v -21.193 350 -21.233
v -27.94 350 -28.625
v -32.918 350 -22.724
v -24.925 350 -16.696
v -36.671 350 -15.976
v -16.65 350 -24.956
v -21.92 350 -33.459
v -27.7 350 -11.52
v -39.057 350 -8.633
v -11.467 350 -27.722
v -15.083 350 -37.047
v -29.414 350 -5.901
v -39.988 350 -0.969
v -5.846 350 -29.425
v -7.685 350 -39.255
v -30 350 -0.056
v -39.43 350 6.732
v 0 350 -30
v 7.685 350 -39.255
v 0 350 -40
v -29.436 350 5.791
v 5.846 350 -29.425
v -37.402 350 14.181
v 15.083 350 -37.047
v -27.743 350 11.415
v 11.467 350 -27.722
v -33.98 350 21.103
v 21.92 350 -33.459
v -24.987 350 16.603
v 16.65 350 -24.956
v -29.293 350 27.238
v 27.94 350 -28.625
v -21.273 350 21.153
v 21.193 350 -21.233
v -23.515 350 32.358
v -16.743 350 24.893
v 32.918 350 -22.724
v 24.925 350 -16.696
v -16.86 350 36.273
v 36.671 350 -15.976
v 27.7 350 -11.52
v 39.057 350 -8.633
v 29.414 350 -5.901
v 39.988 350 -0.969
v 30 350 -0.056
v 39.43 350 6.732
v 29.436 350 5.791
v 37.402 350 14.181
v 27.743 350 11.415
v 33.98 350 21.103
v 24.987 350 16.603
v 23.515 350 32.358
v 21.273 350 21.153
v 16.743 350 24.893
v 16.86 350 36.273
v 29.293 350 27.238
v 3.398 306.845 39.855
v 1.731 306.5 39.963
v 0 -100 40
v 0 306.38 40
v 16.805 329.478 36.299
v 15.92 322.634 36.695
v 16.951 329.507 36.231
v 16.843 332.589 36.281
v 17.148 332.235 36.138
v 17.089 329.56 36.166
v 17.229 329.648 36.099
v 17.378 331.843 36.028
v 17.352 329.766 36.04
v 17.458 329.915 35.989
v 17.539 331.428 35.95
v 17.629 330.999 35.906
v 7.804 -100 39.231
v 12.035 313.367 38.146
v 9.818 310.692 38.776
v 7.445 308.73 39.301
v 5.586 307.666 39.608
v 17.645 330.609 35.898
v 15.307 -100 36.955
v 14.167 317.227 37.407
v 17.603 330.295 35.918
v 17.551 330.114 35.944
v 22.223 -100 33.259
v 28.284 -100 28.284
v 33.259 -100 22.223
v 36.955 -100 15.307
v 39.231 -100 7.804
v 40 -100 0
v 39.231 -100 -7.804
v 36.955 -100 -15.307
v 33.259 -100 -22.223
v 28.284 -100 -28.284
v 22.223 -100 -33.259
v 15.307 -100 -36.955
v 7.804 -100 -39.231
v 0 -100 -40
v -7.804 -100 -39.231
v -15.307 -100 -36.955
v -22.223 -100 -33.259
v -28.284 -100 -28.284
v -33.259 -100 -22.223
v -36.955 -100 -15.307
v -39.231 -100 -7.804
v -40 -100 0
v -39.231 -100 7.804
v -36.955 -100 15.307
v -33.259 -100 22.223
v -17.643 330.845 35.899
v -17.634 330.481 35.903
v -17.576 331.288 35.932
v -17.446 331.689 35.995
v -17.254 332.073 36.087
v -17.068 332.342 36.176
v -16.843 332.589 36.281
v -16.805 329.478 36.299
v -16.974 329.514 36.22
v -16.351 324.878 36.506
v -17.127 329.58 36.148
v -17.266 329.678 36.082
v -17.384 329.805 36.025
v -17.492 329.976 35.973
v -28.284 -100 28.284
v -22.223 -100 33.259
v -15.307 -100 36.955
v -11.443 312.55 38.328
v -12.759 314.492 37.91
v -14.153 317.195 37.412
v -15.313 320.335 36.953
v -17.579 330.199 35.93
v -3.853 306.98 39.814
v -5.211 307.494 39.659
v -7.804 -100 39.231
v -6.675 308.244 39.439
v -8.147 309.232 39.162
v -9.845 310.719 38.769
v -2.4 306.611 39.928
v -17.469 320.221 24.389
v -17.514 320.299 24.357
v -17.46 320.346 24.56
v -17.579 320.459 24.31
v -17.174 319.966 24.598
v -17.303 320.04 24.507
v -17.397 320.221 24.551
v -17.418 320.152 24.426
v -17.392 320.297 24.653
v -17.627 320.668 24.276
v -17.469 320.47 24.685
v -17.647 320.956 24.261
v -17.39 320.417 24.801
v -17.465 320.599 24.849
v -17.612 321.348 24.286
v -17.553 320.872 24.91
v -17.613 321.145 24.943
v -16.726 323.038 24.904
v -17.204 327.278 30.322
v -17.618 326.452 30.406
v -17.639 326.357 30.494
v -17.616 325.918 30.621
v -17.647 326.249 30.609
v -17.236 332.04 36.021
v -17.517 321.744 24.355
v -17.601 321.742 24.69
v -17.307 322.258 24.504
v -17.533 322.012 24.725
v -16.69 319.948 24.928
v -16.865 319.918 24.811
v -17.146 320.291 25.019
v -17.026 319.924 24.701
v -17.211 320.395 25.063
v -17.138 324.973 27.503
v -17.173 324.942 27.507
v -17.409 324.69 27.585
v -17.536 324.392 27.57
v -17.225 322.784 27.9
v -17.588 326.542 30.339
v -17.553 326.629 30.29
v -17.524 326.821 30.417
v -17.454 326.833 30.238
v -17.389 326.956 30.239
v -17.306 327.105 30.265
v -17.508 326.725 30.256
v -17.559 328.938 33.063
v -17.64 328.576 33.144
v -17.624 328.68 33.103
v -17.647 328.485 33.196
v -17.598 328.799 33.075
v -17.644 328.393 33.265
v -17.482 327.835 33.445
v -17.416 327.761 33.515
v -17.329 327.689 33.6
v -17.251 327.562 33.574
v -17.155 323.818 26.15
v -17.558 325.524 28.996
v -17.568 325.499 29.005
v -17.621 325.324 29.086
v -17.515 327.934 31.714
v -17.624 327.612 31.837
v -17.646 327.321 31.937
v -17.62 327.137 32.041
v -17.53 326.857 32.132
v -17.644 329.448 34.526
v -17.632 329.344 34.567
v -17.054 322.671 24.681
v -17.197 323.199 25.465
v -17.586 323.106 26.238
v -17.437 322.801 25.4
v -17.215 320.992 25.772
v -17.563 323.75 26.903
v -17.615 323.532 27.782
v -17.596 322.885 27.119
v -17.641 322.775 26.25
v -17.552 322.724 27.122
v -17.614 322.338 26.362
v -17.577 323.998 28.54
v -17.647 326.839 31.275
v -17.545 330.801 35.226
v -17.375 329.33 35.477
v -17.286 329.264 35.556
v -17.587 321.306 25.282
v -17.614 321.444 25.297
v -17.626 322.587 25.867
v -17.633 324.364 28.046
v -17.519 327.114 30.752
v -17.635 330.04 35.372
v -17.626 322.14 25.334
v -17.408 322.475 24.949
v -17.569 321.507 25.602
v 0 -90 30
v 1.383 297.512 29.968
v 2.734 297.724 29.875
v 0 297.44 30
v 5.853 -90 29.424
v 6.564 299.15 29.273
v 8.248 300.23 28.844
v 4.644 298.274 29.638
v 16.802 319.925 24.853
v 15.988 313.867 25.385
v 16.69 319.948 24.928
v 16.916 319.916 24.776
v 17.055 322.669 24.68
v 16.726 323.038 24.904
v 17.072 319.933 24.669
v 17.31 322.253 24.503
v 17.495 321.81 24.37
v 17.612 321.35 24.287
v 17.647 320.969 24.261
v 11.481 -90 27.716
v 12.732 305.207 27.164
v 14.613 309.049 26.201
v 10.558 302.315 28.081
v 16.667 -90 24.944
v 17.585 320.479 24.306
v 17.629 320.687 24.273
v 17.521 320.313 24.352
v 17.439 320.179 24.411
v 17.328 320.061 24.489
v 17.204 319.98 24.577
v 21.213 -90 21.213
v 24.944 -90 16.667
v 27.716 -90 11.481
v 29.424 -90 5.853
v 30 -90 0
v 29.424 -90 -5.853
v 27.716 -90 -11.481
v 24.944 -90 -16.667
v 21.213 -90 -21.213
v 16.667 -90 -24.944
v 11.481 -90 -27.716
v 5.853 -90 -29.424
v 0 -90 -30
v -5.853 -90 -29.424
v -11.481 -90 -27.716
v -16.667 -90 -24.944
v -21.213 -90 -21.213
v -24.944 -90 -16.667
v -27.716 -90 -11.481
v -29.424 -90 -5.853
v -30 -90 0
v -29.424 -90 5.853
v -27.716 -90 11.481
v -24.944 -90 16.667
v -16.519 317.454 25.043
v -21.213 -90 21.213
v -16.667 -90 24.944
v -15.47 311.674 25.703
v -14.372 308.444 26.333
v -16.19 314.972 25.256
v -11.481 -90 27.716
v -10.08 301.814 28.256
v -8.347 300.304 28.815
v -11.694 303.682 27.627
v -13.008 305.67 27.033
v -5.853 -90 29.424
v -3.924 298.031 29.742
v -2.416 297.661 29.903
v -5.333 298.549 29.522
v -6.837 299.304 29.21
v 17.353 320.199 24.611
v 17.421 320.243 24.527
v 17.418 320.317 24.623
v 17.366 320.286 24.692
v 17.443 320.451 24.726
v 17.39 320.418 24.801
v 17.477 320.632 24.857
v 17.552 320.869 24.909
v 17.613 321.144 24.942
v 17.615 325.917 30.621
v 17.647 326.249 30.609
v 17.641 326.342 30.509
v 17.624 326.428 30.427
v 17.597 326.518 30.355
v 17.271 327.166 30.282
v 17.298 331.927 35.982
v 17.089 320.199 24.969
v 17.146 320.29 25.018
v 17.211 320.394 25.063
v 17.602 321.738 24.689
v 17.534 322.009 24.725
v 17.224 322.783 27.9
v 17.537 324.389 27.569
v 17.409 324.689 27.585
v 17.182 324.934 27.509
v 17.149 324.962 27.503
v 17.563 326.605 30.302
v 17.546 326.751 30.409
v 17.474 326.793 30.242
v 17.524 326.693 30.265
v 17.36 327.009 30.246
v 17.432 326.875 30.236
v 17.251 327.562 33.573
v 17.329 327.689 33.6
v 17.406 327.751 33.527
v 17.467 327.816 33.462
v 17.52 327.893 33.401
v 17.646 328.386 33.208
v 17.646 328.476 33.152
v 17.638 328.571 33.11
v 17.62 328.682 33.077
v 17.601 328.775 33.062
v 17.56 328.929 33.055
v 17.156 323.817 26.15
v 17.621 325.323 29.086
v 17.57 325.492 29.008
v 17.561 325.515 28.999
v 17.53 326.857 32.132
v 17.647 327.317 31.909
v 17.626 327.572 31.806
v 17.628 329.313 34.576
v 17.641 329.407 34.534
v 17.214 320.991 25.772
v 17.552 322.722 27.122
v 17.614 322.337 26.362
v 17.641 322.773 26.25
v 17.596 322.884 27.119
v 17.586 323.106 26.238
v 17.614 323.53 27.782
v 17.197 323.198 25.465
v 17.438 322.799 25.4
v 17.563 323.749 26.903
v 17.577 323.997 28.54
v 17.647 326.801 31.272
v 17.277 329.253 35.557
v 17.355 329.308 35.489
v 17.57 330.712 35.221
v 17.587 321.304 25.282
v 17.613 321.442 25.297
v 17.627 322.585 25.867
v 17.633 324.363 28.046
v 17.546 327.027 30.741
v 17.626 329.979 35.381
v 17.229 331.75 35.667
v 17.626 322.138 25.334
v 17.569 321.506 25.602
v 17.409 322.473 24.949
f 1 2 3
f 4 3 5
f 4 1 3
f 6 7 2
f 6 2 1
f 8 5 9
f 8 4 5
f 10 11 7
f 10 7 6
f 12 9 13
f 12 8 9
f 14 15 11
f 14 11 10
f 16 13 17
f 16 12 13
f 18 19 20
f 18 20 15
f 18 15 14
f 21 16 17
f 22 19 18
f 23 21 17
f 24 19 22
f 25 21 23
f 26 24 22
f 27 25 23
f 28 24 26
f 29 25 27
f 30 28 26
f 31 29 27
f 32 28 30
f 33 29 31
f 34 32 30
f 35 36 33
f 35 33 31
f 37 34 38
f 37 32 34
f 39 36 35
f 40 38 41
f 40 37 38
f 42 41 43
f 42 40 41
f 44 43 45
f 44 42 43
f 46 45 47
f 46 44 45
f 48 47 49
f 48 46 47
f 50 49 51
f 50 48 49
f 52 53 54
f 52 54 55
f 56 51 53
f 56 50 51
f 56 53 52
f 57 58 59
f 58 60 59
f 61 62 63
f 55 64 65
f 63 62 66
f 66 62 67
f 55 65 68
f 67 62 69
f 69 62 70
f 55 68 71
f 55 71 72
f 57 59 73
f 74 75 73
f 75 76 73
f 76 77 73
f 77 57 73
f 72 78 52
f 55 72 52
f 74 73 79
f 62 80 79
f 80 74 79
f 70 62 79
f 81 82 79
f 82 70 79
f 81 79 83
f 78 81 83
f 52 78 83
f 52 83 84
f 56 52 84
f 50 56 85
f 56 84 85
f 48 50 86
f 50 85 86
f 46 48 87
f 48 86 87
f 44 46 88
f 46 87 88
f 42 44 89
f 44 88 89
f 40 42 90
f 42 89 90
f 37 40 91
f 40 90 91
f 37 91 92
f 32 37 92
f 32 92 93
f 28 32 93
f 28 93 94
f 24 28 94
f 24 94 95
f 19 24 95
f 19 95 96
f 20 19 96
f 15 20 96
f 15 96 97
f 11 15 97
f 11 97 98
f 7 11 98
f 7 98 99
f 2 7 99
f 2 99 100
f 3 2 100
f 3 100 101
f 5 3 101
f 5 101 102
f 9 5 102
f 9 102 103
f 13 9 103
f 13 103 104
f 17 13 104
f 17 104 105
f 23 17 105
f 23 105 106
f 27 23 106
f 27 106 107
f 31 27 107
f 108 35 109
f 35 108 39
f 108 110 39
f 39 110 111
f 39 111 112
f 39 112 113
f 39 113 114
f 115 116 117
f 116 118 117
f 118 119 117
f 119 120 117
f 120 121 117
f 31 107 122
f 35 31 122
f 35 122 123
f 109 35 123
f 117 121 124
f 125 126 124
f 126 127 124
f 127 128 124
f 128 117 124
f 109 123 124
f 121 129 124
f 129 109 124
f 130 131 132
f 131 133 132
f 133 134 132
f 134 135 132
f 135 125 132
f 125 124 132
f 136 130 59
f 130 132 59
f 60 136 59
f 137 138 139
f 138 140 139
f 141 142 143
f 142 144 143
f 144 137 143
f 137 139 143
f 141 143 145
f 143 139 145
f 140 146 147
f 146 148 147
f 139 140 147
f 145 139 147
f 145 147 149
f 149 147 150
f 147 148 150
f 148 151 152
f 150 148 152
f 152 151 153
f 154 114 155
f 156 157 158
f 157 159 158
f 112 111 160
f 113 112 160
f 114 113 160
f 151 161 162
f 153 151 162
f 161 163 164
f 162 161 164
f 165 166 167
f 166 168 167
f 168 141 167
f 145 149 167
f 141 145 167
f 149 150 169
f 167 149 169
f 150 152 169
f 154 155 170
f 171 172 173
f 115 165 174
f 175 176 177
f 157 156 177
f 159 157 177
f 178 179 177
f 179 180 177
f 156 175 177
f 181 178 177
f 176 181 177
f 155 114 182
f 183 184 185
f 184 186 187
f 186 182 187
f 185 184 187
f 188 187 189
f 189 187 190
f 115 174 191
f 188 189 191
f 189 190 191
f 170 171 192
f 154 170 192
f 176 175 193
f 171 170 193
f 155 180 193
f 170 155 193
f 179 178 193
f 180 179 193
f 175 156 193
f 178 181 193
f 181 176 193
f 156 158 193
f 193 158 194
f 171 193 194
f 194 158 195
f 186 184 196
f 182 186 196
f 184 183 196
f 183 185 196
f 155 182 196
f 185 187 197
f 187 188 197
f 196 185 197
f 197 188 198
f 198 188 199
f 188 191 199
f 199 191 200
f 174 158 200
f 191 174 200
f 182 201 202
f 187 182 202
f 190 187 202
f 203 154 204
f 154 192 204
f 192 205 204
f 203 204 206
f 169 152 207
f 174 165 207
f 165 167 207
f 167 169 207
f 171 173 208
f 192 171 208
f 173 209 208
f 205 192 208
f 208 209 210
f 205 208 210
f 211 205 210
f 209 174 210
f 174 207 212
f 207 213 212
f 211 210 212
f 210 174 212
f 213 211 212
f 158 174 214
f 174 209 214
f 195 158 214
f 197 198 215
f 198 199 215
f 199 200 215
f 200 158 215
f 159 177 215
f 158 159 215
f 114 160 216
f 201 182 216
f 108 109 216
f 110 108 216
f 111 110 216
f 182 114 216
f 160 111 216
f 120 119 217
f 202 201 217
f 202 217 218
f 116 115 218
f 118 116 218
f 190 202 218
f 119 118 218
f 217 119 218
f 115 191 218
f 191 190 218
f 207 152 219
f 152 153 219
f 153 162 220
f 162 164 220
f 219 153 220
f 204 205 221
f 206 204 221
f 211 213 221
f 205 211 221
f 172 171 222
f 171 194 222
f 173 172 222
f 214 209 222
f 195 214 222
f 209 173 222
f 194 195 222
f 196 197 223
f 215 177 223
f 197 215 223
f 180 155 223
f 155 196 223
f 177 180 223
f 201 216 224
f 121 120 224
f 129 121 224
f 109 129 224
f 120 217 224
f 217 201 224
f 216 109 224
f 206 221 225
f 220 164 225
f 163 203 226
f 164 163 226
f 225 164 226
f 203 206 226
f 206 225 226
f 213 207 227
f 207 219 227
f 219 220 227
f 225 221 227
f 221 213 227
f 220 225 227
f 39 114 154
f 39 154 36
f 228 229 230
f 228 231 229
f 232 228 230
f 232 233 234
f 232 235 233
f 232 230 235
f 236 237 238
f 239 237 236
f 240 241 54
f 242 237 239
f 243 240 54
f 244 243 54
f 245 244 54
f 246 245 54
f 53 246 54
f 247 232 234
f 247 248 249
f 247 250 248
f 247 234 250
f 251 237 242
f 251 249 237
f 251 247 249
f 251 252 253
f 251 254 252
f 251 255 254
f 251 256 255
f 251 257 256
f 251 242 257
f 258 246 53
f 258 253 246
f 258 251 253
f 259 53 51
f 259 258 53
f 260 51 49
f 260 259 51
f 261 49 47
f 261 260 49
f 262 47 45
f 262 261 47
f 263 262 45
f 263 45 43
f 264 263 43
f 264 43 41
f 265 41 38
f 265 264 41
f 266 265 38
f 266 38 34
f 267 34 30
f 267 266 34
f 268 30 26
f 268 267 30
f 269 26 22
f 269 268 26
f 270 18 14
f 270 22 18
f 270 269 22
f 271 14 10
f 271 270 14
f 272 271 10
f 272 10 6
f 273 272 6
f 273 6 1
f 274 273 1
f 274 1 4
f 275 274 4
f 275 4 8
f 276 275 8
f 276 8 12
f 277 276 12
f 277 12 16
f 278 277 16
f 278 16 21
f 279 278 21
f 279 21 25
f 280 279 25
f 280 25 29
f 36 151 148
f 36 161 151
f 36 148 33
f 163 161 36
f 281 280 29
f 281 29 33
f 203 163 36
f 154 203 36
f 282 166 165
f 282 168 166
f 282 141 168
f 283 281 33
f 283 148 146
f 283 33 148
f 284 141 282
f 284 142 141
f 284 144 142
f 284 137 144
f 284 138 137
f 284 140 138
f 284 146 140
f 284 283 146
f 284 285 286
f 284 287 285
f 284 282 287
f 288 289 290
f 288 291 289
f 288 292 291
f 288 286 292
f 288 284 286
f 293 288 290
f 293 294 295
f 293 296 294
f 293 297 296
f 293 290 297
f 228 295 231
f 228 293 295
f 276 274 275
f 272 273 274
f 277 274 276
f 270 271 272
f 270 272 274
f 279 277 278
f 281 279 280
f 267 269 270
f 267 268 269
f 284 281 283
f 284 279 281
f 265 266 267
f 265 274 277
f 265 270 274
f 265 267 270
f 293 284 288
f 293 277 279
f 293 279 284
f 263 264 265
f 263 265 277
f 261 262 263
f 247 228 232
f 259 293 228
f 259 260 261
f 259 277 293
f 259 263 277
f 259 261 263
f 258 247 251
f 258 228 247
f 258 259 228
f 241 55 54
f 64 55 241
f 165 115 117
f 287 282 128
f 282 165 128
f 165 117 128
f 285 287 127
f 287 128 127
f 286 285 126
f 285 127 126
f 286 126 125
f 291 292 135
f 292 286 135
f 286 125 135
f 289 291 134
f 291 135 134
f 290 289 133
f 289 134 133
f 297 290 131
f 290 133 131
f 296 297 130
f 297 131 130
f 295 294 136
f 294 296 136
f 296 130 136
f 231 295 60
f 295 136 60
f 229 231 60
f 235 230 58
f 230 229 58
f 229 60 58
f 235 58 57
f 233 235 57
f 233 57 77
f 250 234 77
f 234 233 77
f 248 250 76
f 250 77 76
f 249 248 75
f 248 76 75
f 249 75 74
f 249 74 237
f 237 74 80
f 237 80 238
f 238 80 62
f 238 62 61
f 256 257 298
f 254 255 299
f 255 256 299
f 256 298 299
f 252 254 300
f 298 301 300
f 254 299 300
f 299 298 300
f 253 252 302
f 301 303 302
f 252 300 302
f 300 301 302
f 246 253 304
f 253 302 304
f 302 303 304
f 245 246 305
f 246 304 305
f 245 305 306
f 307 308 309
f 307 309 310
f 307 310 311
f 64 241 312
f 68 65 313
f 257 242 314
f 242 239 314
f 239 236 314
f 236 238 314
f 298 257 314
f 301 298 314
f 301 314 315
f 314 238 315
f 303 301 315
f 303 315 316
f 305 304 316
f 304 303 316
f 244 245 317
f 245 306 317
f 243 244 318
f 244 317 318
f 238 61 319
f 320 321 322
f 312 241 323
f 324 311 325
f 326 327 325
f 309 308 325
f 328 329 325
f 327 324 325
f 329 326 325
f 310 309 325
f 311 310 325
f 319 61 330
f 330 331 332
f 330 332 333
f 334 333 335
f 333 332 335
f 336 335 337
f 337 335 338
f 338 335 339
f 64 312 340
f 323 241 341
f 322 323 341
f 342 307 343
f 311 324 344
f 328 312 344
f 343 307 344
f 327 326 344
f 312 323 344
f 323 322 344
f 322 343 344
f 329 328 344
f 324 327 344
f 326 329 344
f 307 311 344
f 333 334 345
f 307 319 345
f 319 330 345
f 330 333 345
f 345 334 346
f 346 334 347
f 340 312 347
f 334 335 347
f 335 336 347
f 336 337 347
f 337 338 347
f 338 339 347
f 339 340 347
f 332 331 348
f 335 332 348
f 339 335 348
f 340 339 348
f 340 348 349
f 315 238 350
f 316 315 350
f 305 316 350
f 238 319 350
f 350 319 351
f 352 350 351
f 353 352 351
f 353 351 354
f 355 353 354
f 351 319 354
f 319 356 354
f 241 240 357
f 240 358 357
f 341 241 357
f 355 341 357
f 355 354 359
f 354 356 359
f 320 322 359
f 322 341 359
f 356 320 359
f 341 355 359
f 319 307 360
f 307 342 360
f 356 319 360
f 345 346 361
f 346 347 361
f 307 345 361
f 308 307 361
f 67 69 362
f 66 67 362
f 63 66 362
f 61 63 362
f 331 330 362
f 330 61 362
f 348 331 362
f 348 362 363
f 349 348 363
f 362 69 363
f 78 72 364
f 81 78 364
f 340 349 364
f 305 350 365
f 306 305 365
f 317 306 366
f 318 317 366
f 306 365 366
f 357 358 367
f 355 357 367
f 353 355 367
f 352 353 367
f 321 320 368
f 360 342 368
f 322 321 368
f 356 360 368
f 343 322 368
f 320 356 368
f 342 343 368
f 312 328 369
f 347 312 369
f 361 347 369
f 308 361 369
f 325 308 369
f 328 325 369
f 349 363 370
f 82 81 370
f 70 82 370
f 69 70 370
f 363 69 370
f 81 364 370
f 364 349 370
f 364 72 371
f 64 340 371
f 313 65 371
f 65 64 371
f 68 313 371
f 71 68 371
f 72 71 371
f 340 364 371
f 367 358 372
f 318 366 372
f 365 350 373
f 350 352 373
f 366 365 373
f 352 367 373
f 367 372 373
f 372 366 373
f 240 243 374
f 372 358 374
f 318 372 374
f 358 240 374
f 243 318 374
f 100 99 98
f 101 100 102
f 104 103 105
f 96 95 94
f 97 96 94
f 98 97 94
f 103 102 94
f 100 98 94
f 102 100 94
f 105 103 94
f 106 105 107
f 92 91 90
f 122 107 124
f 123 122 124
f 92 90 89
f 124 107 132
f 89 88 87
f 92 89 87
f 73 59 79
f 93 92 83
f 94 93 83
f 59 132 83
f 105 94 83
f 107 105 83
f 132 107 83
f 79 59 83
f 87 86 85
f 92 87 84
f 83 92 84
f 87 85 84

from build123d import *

# Parameters (mm, degrees)
BOSS_EXTRUDE2_DEPTH      = 350
BOSS_EXTRUDE2_DEPTH_BACK = 100
SKETCH12_R               = 40
SHELL1_T                 = -10


with BuildPart() as part:
    # Sketch12 → Boss-Extrude2 (new, two sides: drawn at the far end of the back side and taken through both)
    with BuildSketch(Plane(origin=(0, 0, 0), x_dir=(1, 0, 0), z_dir=(0, 1, 0)).offset(-BOSS_EXTRUDE2_DEPTH_BACK)):
        with Locations(Location((0, 0, 0), (0, 0, 270))):
            Circle(SKETCH12_R)
    extrude(amount=BOSS_EXTRUDE2_DEPTH + BOSS_EXTRUDE2_DEPTH_BACK)

    # Shell1
    shell1_openings = [part.faces().sort_by_distance(p)[0] for p in [
        (0, 350, 0),
    ]]
    offset(amount=SHELL1_T, openings=shell1_openings, kind=Kind.INTERSECTION)

    # Cut-Loft1: read off the stored shape, not the designer's step
    # Cut-Loft1: loft between two sections, ruled curve by curve
    cut_loft1_from = [
        Edge.make_bspline([(16.447768561, 299.687176089, 0.756078446), (16.559756866, 299.68551177, 0.757474976), (16.685169468, 299.695855255, 0.748795762), (16.948630904, 299.758019264, 0.696633965), (17.086724057, 299.810484473, 0.652610427), (17.338586824, 299.967314565, 0.521014355), (17.451178642, 300.072155873, 0.433042052), (17.606011876, 300.316064015, 0.22837882), (17.647058824, 300.454214414, 0.112456871), (17.647058824, 300.722256174, -0.112456871), (17.606011876, 300.860406573, -0.22837882), (17.451178642, 301.104314716, -0.433042052), (17.338586824, 301.209156023, -0.521014355), (17.086724057, 301.365986115, -0.652610427), (16.948630904, 301.418451325, -0.696633965), (16.685169468, 301.480615333, -0.748795762), (16.559756866, 301.490958819, -0.757474976), (16.447768561, 301.489294499, -0.756078446)], [0, 0, 0, 0, 0.125, 0.125, 0.25, 0.25, 0.375, 0.375, 0.5, 0.5, 0.625, 0.625, 0.75, 0.75, 0.875, 0.875, 1, 1, 1, 1], 3),
        Edge.make_bspline([(16.447768561, 301.489294499, -0.756078446), (14.881581053, 332.389152096, -26.684137559), (-14.881581053, 332.389152096, -26.684137559), (-16.447768561, 301.489294499, -0.756078446)], [0, 0, 0, 0, 1, 1, 1, 1], 3, [1, 0.368414451, 0.368414451, 1]),
        Edge.make_bspline([(-16.447768561, 299.687176089, 0.756078446), (-14.881581053, 268.787318493, 26.684137559), (14.881581053, 268.787318493, 26.684137559), (16.447768561, 299.687176089, 0.756078446)], [0, 0, 0, 0, 1, 1, 1, 1], 3, [1, 0.368414451, 0.368414451, 1]),
        Edge.make_bspline([(-16.447768561, 301.489294499, -0.756078446), (-16.559756866, 301.490958819, -0.757474976), (-16.685169468, 301.480615333, -0.748795762), (-16.948630904, 301.418451325, -0.696633965), (-17.086724057, 301.365986115, -0.652610427), (-17.338586824, 301.209156023, -0.521014355), (-17.451178642, 301.104314716, -0.433042052), (-17.606011876, 300.860406573, -0.22837882), (-17.647058824, 300.722256174, -0.112456871), (-17.647058824, 300.454214414, 0.112456871), (-17.606011876, 300.316064015, 0.22837882), (-17.451178642, 300.072155873, 0.433042052), (-17.338586824, 299.967314565, 0.521014355), (-17.086724057, 299.810484473, 0.652610427), (-16.948630904, 299.758019264, 0.696633965), (-16.685169468, 299.695855255, 0.748795762), (-16.559756866, 299.68551177, 0.757474976), (-16.447768561, 299.687176089, 0.756078446)], [0, 0, 0, 0, 0.125, 0.125, 0.25, 0.25, 0.375, 0.375, 0.5, 0.5, 0.625, 0.625, 0.75, 0.75, 0.875, 0.875, 1, 1, 1, 1], 3),
    ]
    cut_loft1_to = [
        Edge.make_bspline([(17.602105154, 396.042079443, 115.71580798), (17.609587889, 396.12223285, 115.648551286), (17.616135283, 396.20246302, 115.58123018), (17.627359386, 396.363038504, 115.44649135), (17.632036096, 396.443383819, 115.379073626), (17.639518831, 396.604151212, 115.244173766), (17.642324857, 396.68457329, 115.17669163), (17.646066225, 396.845455828, 115.041695152), (17.647001567, 396.925916287, 114.97418081), (17.647001567, 397.086837207, 114.839152126), (17.646066225, 397.167297667, 114.771637784), (17.642324857, 397.328180204, 114.636641306), (17.639518831, 397.408602282, 114.569159169), (17.632036096, 397.569369675, 114.434259309), (17.627359386, 397.64971499, 114.366841585), (17.616135283, 397.810290475, 114.232102756), (17.609587889, 397.890520644, 114.16478165), (17.602105154, 397.970674051, 114.097524956)], [0, 0, 0, 0, 0.125, 0.125, 0.25, 0.25, 0.375, 0.375, 0.5, 0.5, 0.625, 0.625, 0.75, 0.75, 0.875, 0.875, 1, 1, 1, 1], 3),
        Edge.make_bspline([(17.602105154, 397.970674051, 114.097524956), (15.404444247, 421.511531348, 94.34440028), (-15.404444247, 421.511531348, 94.34440028), (-17.602105154, 397.970674051, 114.097524956)], [0, 0, 0, 0, 1, 1, 1, 1], 3, [1, 0.380888028, 0.380888028, 1]),
        Edge.make_bspline([(-17.602105154, 396.042079443, 115.71580798), (-15.404444247, 372.501222146, 135.468932655), (15.404444247, 372.501222146, 135.468932655), (17.602105154, 396.042079443, 115.71580798)], [0, 0, 0, 0, 1, 1, 1, 1], 3, [1, 0.380888028, 0.380888028, 1]),
        Edge.make_bspline([(-17.602105154, 397.970674051, 114.097524956), (-17.609587889, 397.890520644, 114.16478165), (-17.616135283, 397.810290475, 114.232102756), (-17.627359386, 397.64971499, 114.366841585), (-17.632036096, 397.569369675, 114.434259309), (-17.639518831, 397.408602282, 114.569159169), (-17.642324857, 397.328180204, 114.636641306), (-17.646066225, 397.167297667, 114.771637784), (-17.647001567, 397.086837207, 114.839152126), (-17.647001567, 396.925916287, 114.97418081), (-17.646066225, 396.845455828, 115.041695152), (-17.642324857, 396.68457329, 115.17669163), (-17.639518831, 396.604151212, 115.244173766), (-17.632036096, 396.443383819, 115.379073626), (-17.627359386, 396.363038504, 115.44649135), (-17.616135283, 396.20246302, 115.58123018), (-17.609587889, 396.12223285, 115.648551286), (-17.602105154, 396.042079443, 115.71580798)], [0, 0, 0, 0, 0.125, 0.125, 0.25, 0.25, 0.375, 0.375, 0.5, 0.5, 0.625, 0.625, 0.75, 0.75, 0.875, 0.875, 1, 1, 1, 1], 3),
    ]
    cut_loft1 = Solid(Shell([*[Face.make_surface_from_curves(cut_loft1_from[k], cut_loft1_to[k]) for k in range(4)], Face(Wire(cut_loft1_from)), Face(Wire(cut_loft1_to))]))
    add(cut_loft1, mode=Mode.SUBTRACT)

    # Sketch15 → Cut-Loft3 section 0
    with BuildSketch(Plane.XY):
        with BuildLine():
            Line((-16.470588235, 350), (16.470588235, 350))
            Line((16.470588235, 350), (16.470588235, 300.588235294))
            Line((16.470588235, 300.588235294), (-16.470588235, 300.588235294))
            Line((-16.470588235, 300.588235294), (-16.470588235, 350))
        make_face()
    # Sketch20 → Cut-Loft3 section 1
    with BuildSketch(Plane(origin=(0, 397.006376747, 114.906666468), x_dir=(1, 0, 0), z_dir=(0, 0.6427876096865435, 0.7660444431189747))):
        with BuildLine():
            Line((-17.647058824, 0), (-17.647058824, 17.647058824))
            Line((-17.647058824, 17.647058824), (17.647058824, 17.647058824))
            Line((17.647058824, 17.647058824), (17.647058824, 0))
            ThreePointArc((17.647058824, 0), (0, -17.647058824), (-17.647058824, 0))
        make_face()
    loft(mode=Mode.SUBTRACT)


solid = part.part
